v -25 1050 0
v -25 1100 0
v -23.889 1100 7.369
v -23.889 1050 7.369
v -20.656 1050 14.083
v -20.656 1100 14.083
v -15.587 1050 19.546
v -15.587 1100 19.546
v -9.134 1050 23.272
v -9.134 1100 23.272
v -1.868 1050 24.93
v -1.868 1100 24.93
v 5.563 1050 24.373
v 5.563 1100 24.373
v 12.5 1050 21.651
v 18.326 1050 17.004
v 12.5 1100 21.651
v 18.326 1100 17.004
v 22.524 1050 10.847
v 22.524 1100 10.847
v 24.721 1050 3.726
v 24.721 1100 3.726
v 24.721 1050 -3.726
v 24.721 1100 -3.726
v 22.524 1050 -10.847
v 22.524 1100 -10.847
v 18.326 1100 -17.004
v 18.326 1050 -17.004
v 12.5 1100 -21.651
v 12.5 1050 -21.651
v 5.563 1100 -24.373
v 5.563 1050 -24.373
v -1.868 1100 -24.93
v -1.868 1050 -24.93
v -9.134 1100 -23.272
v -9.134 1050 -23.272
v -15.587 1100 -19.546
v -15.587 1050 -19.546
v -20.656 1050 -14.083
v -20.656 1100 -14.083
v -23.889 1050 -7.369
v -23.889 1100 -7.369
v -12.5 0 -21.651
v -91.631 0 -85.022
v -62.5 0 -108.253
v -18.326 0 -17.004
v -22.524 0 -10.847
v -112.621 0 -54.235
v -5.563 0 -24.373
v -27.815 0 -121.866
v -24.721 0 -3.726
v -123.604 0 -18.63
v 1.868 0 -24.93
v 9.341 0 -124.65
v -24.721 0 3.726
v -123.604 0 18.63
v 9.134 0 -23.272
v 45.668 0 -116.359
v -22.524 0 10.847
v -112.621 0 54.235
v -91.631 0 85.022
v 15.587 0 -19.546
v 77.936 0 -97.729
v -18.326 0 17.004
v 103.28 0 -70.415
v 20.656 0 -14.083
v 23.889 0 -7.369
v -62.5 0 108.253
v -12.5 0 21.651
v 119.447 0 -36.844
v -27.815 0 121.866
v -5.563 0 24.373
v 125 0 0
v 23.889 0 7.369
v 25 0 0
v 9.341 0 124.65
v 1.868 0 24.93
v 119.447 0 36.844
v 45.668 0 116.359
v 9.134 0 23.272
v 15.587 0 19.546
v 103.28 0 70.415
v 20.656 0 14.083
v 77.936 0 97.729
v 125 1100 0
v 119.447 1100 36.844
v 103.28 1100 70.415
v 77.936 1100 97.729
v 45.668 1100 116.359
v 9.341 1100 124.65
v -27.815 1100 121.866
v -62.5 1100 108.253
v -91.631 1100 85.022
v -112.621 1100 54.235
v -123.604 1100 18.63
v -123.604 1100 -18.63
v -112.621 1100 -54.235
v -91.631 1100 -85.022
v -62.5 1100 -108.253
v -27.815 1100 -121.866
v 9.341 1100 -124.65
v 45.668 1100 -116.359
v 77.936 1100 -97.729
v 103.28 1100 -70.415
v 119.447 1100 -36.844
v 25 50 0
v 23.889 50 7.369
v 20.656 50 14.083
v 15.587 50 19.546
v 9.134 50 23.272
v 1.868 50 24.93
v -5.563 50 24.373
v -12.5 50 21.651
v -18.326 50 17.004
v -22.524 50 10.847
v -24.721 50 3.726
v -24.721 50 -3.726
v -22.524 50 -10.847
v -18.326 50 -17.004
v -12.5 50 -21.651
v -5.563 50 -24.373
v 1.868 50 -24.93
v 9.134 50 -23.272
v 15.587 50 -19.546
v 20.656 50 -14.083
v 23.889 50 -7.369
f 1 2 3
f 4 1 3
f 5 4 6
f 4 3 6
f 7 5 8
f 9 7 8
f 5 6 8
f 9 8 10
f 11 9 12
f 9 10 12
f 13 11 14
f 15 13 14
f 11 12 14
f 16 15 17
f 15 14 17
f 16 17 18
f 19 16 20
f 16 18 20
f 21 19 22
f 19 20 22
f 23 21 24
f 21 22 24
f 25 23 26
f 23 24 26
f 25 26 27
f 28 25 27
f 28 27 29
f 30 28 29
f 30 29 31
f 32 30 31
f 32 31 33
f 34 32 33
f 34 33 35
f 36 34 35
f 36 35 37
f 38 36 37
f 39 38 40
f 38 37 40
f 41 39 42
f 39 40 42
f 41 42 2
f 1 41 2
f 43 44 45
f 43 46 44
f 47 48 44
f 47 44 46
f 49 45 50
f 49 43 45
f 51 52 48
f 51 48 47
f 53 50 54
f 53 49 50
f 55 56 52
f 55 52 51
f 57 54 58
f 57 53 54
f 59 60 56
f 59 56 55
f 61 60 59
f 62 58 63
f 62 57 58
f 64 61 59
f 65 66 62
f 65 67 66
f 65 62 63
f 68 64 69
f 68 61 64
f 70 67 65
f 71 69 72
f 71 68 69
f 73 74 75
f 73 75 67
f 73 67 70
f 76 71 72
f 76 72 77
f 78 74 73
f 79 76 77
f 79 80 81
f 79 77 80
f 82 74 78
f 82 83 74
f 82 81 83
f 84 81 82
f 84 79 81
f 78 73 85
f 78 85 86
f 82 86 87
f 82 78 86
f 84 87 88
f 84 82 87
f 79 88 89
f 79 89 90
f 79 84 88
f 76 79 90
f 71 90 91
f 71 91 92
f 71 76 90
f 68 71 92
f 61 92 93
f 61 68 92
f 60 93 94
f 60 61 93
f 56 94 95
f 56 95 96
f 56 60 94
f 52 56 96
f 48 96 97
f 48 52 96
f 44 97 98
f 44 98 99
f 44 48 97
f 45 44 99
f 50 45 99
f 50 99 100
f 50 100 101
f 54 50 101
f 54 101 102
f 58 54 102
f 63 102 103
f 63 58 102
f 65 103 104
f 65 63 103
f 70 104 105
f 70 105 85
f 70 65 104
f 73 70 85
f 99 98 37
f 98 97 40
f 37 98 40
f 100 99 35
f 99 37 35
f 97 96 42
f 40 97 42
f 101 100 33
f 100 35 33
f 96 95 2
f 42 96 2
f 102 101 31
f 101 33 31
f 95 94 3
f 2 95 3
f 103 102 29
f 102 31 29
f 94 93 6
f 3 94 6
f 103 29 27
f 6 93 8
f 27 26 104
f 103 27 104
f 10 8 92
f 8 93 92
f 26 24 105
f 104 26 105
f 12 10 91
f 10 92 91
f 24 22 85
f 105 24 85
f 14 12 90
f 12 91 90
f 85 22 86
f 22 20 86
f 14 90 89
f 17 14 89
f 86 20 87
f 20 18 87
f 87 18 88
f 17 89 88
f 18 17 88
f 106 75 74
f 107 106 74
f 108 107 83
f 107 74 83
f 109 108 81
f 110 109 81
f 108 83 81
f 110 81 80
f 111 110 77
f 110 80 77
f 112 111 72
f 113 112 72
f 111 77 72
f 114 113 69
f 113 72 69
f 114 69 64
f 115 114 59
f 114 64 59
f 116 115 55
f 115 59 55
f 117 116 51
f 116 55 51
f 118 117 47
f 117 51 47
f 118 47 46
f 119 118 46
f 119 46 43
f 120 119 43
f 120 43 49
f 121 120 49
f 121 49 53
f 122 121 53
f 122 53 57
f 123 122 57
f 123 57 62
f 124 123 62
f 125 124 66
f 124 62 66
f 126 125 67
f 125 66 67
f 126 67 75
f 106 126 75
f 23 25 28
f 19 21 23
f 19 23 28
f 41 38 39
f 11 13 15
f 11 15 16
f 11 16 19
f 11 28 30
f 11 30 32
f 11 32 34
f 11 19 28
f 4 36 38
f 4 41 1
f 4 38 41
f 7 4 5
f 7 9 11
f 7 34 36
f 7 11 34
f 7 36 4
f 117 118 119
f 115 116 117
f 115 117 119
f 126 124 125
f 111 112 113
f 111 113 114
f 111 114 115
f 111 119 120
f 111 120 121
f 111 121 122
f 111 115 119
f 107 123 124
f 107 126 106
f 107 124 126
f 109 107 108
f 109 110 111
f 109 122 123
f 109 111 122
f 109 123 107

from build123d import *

# Parameters (mm, degrees)
F0_R     = 125
F1_DEPTH = 1100
F2_R     = 25
F3_DEPTH = 50
F4_R     = 25
F5_DEPTH = 50


with BuildPart() as f1:
    # F0 (on Front) → F1 (new body)
    with BuildSketch(Plane.XZ):
        Circle(F0_R)
    extrude(amount=-F1_DEPTH)

    # F2 (on face) → F3 (cut)
    with BuildSketch(Plane.XZ):
        Circle(F2_R)
    extrude(amount=-F3_DEPTH, mode=Mode.SUBTRACT)

    # F4 (on face) → F5 (cut)
    with BuildSketch(Plane(origin=(0, 1100, 0), x_dir=(-1, 0, 0), z_dir=(0, 1, 0))):
        Circle(F4_R)
    extrude(amount=-F5_DEPTH, mode=Mode.SUBTRACT)


solid = f1.part
